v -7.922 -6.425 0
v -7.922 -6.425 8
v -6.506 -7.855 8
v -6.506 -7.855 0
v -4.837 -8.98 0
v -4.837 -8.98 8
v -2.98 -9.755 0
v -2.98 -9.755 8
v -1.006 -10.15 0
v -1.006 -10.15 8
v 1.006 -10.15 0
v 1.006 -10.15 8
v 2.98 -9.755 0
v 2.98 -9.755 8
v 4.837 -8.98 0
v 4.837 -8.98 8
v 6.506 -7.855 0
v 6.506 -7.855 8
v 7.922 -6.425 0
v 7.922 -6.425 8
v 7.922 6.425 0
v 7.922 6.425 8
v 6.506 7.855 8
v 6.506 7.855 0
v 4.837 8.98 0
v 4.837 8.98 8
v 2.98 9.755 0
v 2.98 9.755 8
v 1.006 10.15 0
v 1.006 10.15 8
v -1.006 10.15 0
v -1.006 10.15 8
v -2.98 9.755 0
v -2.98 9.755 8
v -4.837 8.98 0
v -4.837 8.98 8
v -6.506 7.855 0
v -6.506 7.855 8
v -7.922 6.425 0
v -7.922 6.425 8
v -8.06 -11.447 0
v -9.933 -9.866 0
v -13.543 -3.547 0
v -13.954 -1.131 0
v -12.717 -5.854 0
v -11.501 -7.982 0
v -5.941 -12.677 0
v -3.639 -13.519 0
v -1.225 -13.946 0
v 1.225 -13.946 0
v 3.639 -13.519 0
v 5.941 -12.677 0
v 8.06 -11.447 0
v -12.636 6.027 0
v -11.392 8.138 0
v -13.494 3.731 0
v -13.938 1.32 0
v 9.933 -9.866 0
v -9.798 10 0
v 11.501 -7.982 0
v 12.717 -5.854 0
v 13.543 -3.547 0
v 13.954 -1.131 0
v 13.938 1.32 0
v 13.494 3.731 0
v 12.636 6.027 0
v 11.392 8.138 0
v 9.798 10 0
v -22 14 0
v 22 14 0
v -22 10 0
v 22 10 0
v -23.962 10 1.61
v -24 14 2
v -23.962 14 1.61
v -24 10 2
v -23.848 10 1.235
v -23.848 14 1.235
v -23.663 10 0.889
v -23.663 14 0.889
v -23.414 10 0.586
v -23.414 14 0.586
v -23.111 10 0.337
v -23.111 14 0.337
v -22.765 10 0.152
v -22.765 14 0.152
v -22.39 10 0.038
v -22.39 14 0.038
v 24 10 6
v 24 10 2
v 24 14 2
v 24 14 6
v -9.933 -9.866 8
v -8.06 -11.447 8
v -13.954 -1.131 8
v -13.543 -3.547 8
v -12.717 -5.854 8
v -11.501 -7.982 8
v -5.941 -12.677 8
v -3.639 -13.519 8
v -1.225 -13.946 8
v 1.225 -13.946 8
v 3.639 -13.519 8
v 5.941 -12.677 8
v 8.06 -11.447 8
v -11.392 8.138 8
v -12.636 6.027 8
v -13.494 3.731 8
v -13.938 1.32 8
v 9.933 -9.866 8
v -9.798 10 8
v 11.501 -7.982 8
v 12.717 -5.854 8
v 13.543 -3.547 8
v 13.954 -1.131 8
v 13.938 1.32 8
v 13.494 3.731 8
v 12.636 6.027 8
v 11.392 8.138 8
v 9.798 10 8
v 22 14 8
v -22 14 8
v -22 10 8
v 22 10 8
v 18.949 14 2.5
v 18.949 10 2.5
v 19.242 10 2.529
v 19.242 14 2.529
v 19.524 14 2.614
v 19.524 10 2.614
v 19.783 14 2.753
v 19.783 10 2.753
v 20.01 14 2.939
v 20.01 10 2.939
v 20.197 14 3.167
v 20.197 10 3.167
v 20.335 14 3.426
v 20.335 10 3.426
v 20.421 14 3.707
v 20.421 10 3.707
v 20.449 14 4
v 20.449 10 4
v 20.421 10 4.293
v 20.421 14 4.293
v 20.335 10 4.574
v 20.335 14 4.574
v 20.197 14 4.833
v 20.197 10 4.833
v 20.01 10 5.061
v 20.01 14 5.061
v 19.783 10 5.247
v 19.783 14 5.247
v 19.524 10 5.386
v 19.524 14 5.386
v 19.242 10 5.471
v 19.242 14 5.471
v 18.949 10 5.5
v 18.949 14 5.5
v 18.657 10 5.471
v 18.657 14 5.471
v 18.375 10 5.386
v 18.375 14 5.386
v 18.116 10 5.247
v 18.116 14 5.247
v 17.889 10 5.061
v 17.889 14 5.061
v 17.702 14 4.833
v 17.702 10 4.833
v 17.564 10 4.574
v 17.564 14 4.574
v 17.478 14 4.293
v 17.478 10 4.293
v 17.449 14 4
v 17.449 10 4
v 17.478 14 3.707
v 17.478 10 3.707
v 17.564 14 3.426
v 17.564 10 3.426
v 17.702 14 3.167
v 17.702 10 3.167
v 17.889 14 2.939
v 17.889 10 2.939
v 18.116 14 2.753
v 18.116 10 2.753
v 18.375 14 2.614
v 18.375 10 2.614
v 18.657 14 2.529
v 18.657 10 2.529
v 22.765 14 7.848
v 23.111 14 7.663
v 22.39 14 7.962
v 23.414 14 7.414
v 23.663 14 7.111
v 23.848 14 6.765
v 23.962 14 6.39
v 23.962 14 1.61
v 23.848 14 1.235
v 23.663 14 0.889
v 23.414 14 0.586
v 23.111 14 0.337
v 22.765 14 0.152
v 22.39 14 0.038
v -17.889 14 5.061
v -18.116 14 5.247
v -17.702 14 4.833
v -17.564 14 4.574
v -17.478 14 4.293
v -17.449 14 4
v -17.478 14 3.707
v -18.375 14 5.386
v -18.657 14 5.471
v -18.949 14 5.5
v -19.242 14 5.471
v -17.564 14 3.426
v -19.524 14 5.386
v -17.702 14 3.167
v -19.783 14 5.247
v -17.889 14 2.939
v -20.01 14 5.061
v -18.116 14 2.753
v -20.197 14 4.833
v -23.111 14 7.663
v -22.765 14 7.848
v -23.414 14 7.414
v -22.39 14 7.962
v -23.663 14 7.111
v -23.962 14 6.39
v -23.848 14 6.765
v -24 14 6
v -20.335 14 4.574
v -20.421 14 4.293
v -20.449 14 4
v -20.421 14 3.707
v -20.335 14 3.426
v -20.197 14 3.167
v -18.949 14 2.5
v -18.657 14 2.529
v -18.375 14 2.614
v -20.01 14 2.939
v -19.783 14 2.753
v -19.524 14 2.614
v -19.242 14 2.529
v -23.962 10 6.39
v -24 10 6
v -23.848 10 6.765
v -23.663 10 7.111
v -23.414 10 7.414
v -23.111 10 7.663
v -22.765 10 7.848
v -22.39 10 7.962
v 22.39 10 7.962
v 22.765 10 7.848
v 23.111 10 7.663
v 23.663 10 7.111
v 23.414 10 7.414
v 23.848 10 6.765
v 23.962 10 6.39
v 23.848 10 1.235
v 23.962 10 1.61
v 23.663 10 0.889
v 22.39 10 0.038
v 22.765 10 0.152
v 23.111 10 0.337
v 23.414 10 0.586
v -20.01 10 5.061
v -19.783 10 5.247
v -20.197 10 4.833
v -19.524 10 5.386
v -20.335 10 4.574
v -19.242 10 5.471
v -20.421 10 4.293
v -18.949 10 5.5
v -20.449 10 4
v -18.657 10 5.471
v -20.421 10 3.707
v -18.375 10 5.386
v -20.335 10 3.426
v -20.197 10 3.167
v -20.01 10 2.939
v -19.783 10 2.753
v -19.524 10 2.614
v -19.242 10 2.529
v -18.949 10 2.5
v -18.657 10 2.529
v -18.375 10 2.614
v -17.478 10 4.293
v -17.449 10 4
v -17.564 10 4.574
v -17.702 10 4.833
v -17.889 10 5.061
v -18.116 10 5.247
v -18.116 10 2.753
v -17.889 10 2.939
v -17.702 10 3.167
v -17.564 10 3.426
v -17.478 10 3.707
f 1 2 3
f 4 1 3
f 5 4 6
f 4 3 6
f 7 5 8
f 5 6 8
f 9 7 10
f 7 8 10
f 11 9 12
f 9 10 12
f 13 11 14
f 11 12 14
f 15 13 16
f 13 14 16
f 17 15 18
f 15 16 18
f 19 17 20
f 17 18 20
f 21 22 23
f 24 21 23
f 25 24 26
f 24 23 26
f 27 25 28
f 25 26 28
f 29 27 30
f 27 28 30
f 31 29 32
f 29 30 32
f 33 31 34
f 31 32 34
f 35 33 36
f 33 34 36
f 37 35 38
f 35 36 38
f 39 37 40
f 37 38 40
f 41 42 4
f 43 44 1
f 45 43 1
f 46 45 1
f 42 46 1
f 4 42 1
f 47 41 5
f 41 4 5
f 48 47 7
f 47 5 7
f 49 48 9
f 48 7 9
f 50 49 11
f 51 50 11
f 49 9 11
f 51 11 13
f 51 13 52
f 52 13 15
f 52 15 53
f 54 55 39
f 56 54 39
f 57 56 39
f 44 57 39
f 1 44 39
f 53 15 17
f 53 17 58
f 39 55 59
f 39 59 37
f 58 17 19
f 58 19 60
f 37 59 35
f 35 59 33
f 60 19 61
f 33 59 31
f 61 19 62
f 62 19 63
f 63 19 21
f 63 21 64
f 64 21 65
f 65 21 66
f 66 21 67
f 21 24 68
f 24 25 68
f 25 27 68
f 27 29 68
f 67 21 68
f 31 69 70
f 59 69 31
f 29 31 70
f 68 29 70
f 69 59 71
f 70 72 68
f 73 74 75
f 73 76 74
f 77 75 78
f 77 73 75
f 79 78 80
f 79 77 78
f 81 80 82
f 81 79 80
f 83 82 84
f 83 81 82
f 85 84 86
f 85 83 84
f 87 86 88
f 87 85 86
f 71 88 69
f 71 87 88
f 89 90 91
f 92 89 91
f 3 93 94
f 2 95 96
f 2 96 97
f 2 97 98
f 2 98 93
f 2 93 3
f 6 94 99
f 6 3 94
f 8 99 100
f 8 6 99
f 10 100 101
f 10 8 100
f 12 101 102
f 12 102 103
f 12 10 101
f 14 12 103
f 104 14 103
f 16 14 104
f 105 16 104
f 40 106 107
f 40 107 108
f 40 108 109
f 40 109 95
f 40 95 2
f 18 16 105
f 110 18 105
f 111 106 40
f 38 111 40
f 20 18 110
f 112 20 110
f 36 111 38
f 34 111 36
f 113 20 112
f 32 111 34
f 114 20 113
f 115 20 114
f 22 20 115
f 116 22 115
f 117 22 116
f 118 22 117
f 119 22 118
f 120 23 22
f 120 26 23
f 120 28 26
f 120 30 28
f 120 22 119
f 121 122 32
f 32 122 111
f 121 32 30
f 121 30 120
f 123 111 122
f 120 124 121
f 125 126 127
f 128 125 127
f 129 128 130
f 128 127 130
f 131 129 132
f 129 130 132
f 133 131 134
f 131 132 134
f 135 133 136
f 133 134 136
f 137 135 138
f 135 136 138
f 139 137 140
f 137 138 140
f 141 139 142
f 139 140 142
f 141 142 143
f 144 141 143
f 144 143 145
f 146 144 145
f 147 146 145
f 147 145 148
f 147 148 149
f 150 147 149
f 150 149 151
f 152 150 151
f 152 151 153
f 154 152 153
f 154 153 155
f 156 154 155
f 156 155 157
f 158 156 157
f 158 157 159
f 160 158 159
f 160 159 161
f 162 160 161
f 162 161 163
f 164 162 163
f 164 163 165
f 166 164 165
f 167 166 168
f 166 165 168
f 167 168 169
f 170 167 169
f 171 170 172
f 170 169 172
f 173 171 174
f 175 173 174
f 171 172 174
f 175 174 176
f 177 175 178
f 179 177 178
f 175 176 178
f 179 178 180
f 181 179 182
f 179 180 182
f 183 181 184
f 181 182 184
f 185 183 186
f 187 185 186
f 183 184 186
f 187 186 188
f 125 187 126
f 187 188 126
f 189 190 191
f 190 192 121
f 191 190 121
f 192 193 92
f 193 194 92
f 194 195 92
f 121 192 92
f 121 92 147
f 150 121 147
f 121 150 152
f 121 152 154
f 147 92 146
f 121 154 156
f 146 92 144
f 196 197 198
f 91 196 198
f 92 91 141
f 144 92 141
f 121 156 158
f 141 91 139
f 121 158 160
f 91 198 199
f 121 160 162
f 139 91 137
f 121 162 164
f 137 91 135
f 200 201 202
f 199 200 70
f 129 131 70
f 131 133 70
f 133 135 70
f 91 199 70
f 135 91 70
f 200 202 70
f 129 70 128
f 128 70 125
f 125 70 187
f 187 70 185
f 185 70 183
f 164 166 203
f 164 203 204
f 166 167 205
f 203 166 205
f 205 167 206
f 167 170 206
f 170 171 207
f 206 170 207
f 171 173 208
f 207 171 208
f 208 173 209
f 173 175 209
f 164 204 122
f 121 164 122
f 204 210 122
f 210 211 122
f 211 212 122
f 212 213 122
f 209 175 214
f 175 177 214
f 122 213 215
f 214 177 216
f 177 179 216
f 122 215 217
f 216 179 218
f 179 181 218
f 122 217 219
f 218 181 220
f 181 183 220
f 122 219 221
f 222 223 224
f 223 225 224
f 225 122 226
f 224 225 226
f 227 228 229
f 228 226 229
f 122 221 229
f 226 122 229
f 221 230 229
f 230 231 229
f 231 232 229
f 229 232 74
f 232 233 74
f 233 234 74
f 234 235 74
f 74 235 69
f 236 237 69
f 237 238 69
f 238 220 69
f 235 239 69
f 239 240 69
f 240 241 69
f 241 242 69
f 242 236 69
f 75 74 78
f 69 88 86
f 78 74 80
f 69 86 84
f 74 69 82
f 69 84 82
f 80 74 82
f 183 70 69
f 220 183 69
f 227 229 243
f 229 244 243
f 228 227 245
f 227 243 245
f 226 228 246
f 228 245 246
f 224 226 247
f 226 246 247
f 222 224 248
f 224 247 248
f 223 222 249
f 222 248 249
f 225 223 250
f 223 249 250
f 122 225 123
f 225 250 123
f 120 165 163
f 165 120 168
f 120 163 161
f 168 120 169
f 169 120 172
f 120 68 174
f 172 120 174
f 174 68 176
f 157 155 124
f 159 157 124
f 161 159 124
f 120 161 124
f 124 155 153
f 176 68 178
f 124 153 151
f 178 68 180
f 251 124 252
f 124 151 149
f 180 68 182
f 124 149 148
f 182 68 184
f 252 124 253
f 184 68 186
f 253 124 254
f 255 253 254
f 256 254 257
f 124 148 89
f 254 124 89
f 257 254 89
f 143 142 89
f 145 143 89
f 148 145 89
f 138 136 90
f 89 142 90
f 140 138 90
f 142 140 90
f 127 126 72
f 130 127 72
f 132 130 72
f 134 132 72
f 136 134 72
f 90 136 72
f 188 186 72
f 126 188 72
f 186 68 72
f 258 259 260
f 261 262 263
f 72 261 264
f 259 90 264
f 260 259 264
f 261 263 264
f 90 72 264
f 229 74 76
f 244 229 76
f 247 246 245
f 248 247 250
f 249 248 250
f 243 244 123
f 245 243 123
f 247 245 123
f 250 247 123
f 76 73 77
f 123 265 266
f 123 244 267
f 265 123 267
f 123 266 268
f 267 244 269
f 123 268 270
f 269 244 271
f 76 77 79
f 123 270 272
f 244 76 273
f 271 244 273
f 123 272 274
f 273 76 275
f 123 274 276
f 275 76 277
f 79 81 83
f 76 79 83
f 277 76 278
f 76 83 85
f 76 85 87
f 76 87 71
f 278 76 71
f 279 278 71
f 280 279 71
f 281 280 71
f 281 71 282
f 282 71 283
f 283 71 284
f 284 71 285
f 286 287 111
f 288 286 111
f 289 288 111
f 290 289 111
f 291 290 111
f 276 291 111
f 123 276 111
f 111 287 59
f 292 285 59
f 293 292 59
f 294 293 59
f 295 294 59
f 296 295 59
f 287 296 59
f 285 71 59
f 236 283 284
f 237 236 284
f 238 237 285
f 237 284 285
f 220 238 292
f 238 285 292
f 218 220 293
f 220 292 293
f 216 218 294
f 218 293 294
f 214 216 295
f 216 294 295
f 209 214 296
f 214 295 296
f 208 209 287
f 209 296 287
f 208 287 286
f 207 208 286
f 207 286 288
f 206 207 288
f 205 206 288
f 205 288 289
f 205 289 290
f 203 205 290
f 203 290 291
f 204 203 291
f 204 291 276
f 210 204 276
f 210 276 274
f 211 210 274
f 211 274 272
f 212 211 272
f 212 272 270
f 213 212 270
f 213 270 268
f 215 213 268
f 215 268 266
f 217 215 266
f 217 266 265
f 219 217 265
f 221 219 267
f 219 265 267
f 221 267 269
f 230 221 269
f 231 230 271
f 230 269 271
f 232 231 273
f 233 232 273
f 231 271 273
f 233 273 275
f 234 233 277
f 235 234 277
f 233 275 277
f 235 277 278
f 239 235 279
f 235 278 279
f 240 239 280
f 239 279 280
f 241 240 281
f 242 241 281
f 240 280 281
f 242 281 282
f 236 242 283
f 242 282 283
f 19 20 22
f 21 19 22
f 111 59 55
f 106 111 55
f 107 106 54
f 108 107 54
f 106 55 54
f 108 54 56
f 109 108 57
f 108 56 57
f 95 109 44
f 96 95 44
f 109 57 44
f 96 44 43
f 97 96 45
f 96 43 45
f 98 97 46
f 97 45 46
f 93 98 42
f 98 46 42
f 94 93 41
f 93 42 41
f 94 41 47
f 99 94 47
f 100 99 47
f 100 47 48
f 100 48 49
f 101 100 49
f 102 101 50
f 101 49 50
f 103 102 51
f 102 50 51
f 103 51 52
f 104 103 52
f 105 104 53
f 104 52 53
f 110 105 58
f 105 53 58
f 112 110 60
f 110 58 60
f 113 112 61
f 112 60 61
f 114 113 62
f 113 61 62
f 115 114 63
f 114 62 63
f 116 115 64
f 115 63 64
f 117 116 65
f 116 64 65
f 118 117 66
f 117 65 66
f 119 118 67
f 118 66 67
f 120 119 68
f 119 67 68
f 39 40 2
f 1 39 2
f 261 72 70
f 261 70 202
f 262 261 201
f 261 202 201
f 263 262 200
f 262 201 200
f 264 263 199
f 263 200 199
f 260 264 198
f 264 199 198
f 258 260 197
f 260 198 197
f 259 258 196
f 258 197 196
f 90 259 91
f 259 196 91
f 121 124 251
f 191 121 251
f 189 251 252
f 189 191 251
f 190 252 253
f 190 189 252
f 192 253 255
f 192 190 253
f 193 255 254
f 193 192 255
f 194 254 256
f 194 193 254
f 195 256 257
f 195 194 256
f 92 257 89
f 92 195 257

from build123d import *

# Parameters (mm, degrees)
SALIENTE_EXTRUIR1_DEPTH = 8
CORTAR_EXTRUIR1_DEPTH   = 29.91366459
REDONDEO1_R             = 2
CROQUIS3_R              = 1.5
CORTAR_EXTRUIR2_DEPTH   = 35.871191548


with BuildPart() as part:
    # Croquis1 → Saliente-Extruir1 (new body)
    with BuildSketch(Plane.XY):
        with BuildLine():
            Line((0, 14), (-24, 14))
            Line((-24, 14), (-24, 10))
            Line((-24, 10), (-9.797958971, 10))
            ThreePointArc((-9.797958971, 10), (0, -14), (9.797958971, 10))
            Line((9.797958971, 10), (24, 10))
            Line((24, 10), (24, 14))
            Line((24, 14), (0, 14))
        make_face()
    extrude(amount=SALIENTE_EXTRUIR1_DEPTH)

    # Croquis2 → Cortar-Extruir1 (cut, through all)
    with BuildSketch(Plane.XY.offset(8)):
        with BuildLine():
            Line((-7.922081482, 6.425), (-7.922081482, -6.425))
            ThreePointArc((-7.922081482, -6.425), (0, -10.2), (7.922081482, -6.425))
            Line((7.922081482, -6.425), (7.922081482, 6.425))
            ThreePointArc((7.922081482, 6.425), (0, 10.2), (-7.922081482, 6.425))
        make_face()
    extrude(amount=-CORTAR_EXTRUIR1_DEPTH, mode=Mode.SUBTRACT)

    # Redondeo1
    redondeo1_edges = [part.edges().sort_by_distance(p)[0] for p in [
        (-24, 12, 8),
        (24, 12, 8),
        (-24, 12, 0),
        (24, 12, 0),
    ]]
    fillet(redondeo1_edges, radius=REDONDEO1_R)

    # Croquis3 → Cortar-Extruir2 (cut, through all)
    with BuildSketch(Plane(origin=(0, 10, 0), x_dir=(-1, 0, 0), z_dir=(0, -1, 0))):
        with Locations(Location((18.949489743, -4, 0), (0, 0, 90))):
            Circle(CROQUIS3_R)
        with Locations(Location((-18.949489743, -4, 0), (0, 0, 90))):
            Circle(CROQUIS3_R)
    extrude(amount=-CORTAR_EXTRUIR2_DEPTH, mode=Mode.SUBTRACT)


solid = part.part
